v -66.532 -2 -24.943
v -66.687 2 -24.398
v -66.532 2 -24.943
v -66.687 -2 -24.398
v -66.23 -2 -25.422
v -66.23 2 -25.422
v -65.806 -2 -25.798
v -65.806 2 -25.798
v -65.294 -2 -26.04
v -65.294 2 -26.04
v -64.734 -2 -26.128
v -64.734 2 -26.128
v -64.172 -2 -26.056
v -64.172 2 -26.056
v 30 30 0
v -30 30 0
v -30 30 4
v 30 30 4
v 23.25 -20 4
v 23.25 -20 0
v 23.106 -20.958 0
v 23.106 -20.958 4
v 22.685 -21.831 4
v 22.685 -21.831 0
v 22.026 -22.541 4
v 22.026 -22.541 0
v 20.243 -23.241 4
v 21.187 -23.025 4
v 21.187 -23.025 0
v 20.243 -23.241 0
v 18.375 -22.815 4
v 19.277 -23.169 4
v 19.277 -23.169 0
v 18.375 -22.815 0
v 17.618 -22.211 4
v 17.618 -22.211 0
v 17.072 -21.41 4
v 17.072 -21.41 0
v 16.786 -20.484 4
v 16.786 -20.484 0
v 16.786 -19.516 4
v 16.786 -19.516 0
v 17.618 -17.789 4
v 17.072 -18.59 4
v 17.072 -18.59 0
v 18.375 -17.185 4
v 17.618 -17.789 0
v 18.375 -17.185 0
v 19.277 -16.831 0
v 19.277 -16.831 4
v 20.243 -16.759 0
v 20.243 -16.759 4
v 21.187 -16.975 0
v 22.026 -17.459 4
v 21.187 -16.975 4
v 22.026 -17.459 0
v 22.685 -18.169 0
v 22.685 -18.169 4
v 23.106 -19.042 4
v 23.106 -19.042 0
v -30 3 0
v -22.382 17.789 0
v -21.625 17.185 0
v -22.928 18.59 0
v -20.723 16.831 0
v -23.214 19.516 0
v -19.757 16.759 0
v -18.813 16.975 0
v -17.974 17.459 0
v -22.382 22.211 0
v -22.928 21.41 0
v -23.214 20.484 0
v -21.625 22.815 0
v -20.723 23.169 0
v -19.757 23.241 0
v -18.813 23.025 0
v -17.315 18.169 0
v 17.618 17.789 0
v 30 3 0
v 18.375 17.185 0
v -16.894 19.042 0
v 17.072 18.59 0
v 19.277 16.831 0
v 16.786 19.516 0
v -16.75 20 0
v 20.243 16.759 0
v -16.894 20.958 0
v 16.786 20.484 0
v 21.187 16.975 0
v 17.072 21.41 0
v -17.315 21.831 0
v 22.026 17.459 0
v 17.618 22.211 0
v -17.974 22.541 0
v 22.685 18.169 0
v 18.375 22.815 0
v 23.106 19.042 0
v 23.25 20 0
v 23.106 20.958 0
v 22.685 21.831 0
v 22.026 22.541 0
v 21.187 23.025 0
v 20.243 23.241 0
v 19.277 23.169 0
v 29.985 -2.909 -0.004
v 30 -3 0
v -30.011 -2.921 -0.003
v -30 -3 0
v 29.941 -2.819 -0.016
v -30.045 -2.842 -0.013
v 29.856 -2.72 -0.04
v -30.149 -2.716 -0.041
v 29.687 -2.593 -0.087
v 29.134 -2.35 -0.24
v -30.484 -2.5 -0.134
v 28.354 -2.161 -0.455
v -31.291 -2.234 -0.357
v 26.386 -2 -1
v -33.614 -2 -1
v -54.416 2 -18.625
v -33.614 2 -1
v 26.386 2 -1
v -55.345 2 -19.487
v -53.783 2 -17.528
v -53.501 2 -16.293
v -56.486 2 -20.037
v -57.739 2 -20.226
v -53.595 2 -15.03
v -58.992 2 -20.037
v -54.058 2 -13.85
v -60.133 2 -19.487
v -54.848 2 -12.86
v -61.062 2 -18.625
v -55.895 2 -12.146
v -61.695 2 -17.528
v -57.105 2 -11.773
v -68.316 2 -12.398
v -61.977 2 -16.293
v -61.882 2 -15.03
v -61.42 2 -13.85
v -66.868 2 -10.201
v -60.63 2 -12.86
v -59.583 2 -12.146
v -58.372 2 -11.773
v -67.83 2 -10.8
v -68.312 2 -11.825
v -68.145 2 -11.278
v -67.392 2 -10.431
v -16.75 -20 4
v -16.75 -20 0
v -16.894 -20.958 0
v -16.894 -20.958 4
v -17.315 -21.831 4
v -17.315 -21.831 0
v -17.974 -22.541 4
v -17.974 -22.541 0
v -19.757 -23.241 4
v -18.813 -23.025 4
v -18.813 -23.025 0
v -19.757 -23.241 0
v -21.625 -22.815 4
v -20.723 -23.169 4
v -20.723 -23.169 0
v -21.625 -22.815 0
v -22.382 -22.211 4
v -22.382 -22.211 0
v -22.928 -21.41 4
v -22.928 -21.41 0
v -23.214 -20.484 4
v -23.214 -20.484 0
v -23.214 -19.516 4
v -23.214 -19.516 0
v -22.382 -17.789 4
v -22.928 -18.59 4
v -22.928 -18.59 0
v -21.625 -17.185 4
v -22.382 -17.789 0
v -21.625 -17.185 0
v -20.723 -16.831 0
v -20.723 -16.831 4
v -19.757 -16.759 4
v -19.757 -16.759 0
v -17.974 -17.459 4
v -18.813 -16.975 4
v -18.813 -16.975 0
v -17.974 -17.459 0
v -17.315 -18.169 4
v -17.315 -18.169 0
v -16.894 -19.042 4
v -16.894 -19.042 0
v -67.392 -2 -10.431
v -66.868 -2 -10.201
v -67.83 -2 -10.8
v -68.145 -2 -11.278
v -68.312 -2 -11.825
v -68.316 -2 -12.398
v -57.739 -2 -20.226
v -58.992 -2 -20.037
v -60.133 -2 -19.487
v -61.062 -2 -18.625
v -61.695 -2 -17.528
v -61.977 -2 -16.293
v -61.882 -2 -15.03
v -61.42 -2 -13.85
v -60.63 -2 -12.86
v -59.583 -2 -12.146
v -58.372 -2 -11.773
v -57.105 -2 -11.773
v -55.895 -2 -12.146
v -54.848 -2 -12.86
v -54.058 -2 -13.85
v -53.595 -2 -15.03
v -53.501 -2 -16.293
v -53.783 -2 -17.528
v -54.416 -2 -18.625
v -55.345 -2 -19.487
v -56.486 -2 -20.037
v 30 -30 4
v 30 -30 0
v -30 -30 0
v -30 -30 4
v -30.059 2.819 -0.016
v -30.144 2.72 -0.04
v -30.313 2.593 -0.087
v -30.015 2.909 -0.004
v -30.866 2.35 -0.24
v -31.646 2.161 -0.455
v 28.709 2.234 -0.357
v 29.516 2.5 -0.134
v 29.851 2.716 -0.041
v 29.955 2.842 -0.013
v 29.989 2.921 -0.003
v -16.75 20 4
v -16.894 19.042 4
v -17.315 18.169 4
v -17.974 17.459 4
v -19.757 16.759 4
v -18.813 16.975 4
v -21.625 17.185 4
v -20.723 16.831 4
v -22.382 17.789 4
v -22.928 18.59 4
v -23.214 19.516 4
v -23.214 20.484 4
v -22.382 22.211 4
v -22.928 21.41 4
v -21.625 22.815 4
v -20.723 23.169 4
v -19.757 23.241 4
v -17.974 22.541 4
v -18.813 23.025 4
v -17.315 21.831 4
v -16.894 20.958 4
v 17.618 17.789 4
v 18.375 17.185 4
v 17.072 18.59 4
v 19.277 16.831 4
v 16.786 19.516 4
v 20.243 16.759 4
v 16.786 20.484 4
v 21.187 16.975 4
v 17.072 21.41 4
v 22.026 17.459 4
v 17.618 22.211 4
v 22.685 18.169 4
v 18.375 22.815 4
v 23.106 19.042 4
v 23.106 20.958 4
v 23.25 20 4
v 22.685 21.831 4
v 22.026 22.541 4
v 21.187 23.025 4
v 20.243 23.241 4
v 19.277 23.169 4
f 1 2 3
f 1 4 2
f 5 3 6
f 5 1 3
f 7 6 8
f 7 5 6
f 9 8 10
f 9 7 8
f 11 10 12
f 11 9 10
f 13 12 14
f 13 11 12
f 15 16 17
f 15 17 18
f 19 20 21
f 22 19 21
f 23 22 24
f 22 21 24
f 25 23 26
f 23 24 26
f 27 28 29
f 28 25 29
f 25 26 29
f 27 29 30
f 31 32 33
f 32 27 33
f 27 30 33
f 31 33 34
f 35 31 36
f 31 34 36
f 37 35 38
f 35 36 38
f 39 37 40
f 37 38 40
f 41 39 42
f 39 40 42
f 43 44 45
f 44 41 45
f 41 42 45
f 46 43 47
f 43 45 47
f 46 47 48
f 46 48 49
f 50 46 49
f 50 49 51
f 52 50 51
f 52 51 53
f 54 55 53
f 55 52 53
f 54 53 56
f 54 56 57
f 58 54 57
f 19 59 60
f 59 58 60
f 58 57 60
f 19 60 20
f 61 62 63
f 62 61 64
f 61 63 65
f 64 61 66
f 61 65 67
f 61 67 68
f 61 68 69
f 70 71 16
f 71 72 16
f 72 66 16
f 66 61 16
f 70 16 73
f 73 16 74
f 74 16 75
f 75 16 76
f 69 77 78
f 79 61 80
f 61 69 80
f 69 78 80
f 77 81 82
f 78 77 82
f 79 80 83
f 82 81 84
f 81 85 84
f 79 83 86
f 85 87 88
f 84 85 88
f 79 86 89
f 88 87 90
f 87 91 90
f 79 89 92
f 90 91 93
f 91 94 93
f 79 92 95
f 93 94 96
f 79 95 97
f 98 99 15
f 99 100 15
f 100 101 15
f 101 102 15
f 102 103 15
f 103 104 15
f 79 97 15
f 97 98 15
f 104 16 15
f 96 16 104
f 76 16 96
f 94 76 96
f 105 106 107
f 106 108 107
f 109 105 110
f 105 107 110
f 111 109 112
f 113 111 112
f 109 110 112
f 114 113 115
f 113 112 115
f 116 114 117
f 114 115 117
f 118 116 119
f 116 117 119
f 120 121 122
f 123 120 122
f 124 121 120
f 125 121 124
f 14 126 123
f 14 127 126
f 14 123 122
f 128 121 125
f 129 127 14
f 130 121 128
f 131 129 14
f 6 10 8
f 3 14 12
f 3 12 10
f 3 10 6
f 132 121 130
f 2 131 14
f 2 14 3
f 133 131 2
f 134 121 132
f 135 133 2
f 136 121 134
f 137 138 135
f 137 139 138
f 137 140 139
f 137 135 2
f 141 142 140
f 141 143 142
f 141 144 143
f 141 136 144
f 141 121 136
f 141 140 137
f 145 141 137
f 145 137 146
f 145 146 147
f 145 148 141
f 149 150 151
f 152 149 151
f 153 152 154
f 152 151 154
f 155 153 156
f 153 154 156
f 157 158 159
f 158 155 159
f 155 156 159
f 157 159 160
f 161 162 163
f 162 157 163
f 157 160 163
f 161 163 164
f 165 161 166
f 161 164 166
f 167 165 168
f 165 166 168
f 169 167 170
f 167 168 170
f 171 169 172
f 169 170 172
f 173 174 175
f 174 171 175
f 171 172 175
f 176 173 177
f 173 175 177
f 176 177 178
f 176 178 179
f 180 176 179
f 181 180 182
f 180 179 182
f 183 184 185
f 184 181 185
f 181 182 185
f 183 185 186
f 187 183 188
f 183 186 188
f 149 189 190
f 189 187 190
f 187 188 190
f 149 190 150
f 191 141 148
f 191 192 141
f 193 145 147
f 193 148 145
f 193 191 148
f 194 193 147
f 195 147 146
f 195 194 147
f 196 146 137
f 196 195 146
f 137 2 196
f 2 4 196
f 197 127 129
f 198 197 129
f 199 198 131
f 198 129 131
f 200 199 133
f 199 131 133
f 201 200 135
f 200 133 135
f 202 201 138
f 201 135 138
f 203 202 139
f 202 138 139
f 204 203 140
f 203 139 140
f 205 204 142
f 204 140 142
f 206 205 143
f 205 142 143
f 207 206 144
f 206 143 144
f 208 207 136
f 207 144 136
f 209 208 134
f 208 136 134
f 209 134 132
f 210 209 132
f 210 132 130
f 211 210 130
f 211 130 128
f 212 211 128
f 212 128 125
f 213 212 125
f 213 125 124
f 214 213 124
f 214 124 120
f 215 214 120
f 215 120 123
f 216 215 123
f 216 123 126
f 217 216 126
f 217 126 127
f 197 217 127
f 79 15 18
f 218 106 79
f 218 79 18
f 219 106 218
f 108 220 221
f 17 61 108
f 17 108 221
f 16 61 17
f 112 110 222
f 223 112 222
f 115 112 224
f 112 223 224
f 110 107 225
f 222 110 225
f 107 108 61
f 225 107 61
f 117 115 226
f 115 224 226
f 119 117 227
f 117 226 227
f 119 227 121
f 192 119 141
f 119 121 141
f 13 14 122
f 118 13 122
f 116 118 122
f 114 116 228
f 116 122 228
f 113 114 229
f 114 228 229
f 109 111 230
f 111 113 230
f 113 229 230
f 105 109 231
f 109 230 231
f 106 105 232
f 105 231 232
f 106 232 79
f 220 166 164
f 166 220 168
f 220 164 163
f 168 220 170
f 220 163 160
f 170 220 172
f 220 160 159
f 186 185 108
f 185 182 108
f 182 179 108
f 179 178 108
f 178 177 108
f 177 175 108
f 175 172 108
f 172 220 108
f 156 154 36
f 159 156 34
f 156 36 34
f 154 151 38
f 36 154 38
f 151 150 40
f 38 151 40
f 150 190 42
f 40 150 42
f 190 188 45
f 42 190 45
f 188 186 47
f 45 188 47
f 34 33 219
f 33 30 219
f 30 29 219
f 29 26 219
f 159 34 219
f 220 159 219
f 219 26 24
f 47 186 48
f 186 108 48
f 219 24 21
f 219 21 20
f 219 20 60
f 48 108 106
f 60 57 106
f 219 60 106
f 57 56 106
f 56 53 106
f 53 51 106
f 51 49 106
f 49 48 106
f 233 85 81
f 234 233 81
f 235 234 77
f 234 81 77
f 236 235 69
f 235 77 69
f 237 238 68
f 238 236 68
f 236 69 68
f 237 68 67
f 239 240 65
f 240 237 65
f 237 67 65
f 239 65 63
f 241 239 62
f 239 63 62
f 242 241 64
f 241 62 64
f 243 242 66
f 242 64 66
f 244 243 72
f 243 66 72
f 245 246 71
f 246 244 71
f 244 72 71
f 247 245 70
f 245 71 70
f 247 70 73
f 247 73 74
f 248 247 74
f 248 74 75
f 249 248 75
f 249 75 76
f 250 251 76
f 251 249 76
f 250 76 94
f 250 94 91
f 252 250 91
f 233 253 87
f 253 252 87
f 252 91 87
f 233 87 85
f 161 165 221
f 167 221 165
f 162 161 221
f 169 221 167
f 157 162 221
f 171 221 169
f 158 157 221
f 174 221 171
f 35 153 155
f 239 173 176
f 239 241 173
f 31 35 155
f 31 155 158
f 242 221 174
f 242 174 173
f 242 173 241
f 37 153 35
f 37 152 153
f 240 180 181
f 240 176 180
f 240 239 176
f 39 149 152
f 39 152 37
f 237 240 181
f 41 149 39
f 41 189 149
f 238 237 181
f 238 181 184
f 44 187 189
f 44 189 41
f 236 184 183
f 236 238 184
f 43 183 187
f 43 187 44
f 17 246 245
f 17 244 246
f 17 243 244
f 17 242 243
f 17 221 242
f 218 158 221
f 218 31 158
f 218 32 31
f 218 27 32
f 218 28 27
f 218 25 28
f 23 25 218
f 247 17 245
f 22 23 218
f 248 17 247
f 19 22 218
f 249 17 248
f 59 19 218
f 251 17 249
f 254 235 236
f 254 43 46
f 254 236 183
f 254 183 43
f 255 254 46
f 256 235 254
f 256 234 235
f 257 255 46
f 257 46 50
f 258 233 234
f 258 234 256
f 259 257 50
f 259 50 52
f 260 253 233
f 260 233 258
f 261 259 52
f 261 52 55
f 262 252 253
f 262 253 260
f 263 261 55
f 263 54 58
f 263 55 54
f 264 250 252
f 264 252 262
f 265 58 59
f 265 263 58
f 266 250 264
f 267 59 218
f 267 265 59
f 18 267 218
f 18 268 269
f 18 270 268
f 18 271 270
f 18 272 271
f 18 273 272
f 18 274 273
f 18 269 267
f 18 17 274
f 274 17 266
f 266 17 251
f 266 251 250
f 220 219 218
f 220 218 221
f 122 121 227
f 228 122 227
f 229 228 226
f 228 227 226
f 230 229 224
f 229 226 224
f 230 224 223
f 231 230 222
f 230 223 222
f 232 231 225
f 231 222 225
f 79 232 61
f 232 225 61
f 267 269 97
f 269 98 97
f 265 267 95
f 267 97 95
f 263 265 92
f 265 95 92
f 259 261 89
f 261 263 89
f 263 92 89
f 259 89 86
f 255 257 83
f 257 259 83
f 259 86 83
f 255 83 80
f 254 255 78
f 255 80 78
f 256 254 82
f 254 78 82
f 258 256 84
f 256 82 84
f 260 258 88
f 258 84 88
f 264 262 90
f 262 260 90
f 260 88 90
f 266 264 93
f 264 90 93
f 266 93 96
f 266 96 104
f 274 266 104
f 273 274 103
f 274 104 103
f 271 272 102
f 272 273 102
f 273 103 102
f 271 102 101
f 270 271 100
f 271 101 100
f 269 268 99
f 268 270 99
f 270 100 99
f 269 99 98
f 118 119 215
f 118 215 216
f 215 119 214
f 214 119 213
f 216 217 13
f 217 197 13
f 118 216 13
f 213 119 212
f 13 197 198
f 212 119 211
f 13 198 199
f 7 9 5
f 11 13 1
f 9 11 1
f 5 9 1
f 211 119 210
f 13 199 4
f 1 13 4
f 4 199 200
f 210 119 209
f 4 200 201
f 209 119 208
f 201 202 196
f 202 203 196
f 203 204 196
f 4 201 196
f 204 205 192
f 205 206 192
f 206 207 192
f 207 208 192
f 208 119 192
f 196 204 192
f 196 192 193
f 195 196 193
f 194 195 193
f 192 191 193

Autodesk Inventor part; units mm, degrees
ref_plane "YZ Plane" through (0, 0, 0) normal (1, 0, 0) x (0, 1, 0)
ref_plane "XZ Plane" through (0, 0, 0) normal (0, 1, 0) x (-1, 0, 0)
ref_plane "XY Plane" through (0, 0, 0) normal (0, 0, 1) x (1, 0, 0)
sketch "Sketch2" plane through (0, 0, 0) normal (0, 0, 1) x (1, 0, 0)
  line L0 (30, -30) -> (-30, -30)
  line L1 (-30, -30) -> (-30, 30)
  line L2 (-30, 30) -> (30, 30)
  line L3 (30, 30) -> (30, -30)
  line L4 (30, -30) -> (-30, 30) construction
  line L5 (-30, -30) -> (30, 30) construction
  circle A0 centre (-20, 20) radius 3.25
  circle A1 centre (20, 20) radius 3.25
  circle A2 centre (-20, -20) radius 3.25
  circle A3 centre (20, -20) radius 3.25
  point P0 (0, 0)
  dimension "d0" = 60
  dimension "d1" = 60
  dimension "d13" = 6.5
  dimension "d14" = 6.5
  dimension "d15" = 6.5
  dimension "d16" = 6.5
  dimension "d17" = 10
  dimension "d19" = 10
  dimension "d20" = 10
  dimension "d21" = 10
extrude "Extrusion1" add sketch "Sketch2" along normal blind 4
sketch "Sketch5" plane through (0, 0, 0) normal (0, 1, 0) x (-1, 0, 0)
  line L0 (-30, 0) -> (30, 0) construction
  line L1 (30, 0) -> (30, 4) construction
  line L2 (-30, 4) -> (30, 4) construction
  line L3 (-30, 0) -> (-30, 4) construction
  line L4 (88.4744, 0) -> (-49.7457, 0) construction
  line L5 (-30, 0) -> (64.1719, -26.056)
  line L6 (66.687, -24.3976) -> (68.3165, -12.3976)
  line L7 (66.868, -10.2009) -> (30, 0)
  line L8 (30, 0) -> (-30, 0)
  arc A0 (68.3165, -12.3976) -> (66.868, -10.2009) centre (66.3347, -12.1284) ccw
  arc A1 (64.1719, -26.056) -> (66.687, -24.3976) centre (64.7052, -24.1284) ccw
  point P0 (66.3789, -26.6667)
  point P1 (68.5516, -10.6667)
  dimension "d26" = 100
  dimension "d31" = 40
  dimension "d32" = 2
  dimension "d37" = 16
extrude "Extrusion3" add sketch "Sketch5" along normal mid plane 4
fillet "Fillet1" radius 1 2 edges at (0, 2, 0) (0, -2, 0)
sketch "Sketch6" plane through (0, -2, 0) normal (0, -1, 0) x (1, 0, 0)
  line L0 (-33.6142, -1) -> (26.3858, -1) construction
  line L1 (-33.6142, -1) -> (-66.868, -10.2009) construction
  arc A0 (-66.868, -10.2009) -> (-68.3165, -12.3976) centre (-66.3347, -12.1284) ccw construction
  line L2 (-68.3165, -12.3976) -> (-66.687, -24.3976) construction
  arc A1 (-66.687, -24.3976) -> (-64.1719, -26.056) centre (-64.7052, -24.1284) ccw construction
  line L3 (-64.1719, -26.056) -> (26.3858, -1) construction
  point P0 (0, 0)
  point P1 (-57.7389, -15.9755)
  dimension "d34" = 16
  dimension "d35" = 8
  dimension "d36" = 10
hole "Hole1" at (-57.7389, -2, -15.9755) direction (0, 1, 0) diameter 8.5 depth 10
equation "\"d35\" = 0.5 * d34"
properties part number "P044_SupportCaméra"
